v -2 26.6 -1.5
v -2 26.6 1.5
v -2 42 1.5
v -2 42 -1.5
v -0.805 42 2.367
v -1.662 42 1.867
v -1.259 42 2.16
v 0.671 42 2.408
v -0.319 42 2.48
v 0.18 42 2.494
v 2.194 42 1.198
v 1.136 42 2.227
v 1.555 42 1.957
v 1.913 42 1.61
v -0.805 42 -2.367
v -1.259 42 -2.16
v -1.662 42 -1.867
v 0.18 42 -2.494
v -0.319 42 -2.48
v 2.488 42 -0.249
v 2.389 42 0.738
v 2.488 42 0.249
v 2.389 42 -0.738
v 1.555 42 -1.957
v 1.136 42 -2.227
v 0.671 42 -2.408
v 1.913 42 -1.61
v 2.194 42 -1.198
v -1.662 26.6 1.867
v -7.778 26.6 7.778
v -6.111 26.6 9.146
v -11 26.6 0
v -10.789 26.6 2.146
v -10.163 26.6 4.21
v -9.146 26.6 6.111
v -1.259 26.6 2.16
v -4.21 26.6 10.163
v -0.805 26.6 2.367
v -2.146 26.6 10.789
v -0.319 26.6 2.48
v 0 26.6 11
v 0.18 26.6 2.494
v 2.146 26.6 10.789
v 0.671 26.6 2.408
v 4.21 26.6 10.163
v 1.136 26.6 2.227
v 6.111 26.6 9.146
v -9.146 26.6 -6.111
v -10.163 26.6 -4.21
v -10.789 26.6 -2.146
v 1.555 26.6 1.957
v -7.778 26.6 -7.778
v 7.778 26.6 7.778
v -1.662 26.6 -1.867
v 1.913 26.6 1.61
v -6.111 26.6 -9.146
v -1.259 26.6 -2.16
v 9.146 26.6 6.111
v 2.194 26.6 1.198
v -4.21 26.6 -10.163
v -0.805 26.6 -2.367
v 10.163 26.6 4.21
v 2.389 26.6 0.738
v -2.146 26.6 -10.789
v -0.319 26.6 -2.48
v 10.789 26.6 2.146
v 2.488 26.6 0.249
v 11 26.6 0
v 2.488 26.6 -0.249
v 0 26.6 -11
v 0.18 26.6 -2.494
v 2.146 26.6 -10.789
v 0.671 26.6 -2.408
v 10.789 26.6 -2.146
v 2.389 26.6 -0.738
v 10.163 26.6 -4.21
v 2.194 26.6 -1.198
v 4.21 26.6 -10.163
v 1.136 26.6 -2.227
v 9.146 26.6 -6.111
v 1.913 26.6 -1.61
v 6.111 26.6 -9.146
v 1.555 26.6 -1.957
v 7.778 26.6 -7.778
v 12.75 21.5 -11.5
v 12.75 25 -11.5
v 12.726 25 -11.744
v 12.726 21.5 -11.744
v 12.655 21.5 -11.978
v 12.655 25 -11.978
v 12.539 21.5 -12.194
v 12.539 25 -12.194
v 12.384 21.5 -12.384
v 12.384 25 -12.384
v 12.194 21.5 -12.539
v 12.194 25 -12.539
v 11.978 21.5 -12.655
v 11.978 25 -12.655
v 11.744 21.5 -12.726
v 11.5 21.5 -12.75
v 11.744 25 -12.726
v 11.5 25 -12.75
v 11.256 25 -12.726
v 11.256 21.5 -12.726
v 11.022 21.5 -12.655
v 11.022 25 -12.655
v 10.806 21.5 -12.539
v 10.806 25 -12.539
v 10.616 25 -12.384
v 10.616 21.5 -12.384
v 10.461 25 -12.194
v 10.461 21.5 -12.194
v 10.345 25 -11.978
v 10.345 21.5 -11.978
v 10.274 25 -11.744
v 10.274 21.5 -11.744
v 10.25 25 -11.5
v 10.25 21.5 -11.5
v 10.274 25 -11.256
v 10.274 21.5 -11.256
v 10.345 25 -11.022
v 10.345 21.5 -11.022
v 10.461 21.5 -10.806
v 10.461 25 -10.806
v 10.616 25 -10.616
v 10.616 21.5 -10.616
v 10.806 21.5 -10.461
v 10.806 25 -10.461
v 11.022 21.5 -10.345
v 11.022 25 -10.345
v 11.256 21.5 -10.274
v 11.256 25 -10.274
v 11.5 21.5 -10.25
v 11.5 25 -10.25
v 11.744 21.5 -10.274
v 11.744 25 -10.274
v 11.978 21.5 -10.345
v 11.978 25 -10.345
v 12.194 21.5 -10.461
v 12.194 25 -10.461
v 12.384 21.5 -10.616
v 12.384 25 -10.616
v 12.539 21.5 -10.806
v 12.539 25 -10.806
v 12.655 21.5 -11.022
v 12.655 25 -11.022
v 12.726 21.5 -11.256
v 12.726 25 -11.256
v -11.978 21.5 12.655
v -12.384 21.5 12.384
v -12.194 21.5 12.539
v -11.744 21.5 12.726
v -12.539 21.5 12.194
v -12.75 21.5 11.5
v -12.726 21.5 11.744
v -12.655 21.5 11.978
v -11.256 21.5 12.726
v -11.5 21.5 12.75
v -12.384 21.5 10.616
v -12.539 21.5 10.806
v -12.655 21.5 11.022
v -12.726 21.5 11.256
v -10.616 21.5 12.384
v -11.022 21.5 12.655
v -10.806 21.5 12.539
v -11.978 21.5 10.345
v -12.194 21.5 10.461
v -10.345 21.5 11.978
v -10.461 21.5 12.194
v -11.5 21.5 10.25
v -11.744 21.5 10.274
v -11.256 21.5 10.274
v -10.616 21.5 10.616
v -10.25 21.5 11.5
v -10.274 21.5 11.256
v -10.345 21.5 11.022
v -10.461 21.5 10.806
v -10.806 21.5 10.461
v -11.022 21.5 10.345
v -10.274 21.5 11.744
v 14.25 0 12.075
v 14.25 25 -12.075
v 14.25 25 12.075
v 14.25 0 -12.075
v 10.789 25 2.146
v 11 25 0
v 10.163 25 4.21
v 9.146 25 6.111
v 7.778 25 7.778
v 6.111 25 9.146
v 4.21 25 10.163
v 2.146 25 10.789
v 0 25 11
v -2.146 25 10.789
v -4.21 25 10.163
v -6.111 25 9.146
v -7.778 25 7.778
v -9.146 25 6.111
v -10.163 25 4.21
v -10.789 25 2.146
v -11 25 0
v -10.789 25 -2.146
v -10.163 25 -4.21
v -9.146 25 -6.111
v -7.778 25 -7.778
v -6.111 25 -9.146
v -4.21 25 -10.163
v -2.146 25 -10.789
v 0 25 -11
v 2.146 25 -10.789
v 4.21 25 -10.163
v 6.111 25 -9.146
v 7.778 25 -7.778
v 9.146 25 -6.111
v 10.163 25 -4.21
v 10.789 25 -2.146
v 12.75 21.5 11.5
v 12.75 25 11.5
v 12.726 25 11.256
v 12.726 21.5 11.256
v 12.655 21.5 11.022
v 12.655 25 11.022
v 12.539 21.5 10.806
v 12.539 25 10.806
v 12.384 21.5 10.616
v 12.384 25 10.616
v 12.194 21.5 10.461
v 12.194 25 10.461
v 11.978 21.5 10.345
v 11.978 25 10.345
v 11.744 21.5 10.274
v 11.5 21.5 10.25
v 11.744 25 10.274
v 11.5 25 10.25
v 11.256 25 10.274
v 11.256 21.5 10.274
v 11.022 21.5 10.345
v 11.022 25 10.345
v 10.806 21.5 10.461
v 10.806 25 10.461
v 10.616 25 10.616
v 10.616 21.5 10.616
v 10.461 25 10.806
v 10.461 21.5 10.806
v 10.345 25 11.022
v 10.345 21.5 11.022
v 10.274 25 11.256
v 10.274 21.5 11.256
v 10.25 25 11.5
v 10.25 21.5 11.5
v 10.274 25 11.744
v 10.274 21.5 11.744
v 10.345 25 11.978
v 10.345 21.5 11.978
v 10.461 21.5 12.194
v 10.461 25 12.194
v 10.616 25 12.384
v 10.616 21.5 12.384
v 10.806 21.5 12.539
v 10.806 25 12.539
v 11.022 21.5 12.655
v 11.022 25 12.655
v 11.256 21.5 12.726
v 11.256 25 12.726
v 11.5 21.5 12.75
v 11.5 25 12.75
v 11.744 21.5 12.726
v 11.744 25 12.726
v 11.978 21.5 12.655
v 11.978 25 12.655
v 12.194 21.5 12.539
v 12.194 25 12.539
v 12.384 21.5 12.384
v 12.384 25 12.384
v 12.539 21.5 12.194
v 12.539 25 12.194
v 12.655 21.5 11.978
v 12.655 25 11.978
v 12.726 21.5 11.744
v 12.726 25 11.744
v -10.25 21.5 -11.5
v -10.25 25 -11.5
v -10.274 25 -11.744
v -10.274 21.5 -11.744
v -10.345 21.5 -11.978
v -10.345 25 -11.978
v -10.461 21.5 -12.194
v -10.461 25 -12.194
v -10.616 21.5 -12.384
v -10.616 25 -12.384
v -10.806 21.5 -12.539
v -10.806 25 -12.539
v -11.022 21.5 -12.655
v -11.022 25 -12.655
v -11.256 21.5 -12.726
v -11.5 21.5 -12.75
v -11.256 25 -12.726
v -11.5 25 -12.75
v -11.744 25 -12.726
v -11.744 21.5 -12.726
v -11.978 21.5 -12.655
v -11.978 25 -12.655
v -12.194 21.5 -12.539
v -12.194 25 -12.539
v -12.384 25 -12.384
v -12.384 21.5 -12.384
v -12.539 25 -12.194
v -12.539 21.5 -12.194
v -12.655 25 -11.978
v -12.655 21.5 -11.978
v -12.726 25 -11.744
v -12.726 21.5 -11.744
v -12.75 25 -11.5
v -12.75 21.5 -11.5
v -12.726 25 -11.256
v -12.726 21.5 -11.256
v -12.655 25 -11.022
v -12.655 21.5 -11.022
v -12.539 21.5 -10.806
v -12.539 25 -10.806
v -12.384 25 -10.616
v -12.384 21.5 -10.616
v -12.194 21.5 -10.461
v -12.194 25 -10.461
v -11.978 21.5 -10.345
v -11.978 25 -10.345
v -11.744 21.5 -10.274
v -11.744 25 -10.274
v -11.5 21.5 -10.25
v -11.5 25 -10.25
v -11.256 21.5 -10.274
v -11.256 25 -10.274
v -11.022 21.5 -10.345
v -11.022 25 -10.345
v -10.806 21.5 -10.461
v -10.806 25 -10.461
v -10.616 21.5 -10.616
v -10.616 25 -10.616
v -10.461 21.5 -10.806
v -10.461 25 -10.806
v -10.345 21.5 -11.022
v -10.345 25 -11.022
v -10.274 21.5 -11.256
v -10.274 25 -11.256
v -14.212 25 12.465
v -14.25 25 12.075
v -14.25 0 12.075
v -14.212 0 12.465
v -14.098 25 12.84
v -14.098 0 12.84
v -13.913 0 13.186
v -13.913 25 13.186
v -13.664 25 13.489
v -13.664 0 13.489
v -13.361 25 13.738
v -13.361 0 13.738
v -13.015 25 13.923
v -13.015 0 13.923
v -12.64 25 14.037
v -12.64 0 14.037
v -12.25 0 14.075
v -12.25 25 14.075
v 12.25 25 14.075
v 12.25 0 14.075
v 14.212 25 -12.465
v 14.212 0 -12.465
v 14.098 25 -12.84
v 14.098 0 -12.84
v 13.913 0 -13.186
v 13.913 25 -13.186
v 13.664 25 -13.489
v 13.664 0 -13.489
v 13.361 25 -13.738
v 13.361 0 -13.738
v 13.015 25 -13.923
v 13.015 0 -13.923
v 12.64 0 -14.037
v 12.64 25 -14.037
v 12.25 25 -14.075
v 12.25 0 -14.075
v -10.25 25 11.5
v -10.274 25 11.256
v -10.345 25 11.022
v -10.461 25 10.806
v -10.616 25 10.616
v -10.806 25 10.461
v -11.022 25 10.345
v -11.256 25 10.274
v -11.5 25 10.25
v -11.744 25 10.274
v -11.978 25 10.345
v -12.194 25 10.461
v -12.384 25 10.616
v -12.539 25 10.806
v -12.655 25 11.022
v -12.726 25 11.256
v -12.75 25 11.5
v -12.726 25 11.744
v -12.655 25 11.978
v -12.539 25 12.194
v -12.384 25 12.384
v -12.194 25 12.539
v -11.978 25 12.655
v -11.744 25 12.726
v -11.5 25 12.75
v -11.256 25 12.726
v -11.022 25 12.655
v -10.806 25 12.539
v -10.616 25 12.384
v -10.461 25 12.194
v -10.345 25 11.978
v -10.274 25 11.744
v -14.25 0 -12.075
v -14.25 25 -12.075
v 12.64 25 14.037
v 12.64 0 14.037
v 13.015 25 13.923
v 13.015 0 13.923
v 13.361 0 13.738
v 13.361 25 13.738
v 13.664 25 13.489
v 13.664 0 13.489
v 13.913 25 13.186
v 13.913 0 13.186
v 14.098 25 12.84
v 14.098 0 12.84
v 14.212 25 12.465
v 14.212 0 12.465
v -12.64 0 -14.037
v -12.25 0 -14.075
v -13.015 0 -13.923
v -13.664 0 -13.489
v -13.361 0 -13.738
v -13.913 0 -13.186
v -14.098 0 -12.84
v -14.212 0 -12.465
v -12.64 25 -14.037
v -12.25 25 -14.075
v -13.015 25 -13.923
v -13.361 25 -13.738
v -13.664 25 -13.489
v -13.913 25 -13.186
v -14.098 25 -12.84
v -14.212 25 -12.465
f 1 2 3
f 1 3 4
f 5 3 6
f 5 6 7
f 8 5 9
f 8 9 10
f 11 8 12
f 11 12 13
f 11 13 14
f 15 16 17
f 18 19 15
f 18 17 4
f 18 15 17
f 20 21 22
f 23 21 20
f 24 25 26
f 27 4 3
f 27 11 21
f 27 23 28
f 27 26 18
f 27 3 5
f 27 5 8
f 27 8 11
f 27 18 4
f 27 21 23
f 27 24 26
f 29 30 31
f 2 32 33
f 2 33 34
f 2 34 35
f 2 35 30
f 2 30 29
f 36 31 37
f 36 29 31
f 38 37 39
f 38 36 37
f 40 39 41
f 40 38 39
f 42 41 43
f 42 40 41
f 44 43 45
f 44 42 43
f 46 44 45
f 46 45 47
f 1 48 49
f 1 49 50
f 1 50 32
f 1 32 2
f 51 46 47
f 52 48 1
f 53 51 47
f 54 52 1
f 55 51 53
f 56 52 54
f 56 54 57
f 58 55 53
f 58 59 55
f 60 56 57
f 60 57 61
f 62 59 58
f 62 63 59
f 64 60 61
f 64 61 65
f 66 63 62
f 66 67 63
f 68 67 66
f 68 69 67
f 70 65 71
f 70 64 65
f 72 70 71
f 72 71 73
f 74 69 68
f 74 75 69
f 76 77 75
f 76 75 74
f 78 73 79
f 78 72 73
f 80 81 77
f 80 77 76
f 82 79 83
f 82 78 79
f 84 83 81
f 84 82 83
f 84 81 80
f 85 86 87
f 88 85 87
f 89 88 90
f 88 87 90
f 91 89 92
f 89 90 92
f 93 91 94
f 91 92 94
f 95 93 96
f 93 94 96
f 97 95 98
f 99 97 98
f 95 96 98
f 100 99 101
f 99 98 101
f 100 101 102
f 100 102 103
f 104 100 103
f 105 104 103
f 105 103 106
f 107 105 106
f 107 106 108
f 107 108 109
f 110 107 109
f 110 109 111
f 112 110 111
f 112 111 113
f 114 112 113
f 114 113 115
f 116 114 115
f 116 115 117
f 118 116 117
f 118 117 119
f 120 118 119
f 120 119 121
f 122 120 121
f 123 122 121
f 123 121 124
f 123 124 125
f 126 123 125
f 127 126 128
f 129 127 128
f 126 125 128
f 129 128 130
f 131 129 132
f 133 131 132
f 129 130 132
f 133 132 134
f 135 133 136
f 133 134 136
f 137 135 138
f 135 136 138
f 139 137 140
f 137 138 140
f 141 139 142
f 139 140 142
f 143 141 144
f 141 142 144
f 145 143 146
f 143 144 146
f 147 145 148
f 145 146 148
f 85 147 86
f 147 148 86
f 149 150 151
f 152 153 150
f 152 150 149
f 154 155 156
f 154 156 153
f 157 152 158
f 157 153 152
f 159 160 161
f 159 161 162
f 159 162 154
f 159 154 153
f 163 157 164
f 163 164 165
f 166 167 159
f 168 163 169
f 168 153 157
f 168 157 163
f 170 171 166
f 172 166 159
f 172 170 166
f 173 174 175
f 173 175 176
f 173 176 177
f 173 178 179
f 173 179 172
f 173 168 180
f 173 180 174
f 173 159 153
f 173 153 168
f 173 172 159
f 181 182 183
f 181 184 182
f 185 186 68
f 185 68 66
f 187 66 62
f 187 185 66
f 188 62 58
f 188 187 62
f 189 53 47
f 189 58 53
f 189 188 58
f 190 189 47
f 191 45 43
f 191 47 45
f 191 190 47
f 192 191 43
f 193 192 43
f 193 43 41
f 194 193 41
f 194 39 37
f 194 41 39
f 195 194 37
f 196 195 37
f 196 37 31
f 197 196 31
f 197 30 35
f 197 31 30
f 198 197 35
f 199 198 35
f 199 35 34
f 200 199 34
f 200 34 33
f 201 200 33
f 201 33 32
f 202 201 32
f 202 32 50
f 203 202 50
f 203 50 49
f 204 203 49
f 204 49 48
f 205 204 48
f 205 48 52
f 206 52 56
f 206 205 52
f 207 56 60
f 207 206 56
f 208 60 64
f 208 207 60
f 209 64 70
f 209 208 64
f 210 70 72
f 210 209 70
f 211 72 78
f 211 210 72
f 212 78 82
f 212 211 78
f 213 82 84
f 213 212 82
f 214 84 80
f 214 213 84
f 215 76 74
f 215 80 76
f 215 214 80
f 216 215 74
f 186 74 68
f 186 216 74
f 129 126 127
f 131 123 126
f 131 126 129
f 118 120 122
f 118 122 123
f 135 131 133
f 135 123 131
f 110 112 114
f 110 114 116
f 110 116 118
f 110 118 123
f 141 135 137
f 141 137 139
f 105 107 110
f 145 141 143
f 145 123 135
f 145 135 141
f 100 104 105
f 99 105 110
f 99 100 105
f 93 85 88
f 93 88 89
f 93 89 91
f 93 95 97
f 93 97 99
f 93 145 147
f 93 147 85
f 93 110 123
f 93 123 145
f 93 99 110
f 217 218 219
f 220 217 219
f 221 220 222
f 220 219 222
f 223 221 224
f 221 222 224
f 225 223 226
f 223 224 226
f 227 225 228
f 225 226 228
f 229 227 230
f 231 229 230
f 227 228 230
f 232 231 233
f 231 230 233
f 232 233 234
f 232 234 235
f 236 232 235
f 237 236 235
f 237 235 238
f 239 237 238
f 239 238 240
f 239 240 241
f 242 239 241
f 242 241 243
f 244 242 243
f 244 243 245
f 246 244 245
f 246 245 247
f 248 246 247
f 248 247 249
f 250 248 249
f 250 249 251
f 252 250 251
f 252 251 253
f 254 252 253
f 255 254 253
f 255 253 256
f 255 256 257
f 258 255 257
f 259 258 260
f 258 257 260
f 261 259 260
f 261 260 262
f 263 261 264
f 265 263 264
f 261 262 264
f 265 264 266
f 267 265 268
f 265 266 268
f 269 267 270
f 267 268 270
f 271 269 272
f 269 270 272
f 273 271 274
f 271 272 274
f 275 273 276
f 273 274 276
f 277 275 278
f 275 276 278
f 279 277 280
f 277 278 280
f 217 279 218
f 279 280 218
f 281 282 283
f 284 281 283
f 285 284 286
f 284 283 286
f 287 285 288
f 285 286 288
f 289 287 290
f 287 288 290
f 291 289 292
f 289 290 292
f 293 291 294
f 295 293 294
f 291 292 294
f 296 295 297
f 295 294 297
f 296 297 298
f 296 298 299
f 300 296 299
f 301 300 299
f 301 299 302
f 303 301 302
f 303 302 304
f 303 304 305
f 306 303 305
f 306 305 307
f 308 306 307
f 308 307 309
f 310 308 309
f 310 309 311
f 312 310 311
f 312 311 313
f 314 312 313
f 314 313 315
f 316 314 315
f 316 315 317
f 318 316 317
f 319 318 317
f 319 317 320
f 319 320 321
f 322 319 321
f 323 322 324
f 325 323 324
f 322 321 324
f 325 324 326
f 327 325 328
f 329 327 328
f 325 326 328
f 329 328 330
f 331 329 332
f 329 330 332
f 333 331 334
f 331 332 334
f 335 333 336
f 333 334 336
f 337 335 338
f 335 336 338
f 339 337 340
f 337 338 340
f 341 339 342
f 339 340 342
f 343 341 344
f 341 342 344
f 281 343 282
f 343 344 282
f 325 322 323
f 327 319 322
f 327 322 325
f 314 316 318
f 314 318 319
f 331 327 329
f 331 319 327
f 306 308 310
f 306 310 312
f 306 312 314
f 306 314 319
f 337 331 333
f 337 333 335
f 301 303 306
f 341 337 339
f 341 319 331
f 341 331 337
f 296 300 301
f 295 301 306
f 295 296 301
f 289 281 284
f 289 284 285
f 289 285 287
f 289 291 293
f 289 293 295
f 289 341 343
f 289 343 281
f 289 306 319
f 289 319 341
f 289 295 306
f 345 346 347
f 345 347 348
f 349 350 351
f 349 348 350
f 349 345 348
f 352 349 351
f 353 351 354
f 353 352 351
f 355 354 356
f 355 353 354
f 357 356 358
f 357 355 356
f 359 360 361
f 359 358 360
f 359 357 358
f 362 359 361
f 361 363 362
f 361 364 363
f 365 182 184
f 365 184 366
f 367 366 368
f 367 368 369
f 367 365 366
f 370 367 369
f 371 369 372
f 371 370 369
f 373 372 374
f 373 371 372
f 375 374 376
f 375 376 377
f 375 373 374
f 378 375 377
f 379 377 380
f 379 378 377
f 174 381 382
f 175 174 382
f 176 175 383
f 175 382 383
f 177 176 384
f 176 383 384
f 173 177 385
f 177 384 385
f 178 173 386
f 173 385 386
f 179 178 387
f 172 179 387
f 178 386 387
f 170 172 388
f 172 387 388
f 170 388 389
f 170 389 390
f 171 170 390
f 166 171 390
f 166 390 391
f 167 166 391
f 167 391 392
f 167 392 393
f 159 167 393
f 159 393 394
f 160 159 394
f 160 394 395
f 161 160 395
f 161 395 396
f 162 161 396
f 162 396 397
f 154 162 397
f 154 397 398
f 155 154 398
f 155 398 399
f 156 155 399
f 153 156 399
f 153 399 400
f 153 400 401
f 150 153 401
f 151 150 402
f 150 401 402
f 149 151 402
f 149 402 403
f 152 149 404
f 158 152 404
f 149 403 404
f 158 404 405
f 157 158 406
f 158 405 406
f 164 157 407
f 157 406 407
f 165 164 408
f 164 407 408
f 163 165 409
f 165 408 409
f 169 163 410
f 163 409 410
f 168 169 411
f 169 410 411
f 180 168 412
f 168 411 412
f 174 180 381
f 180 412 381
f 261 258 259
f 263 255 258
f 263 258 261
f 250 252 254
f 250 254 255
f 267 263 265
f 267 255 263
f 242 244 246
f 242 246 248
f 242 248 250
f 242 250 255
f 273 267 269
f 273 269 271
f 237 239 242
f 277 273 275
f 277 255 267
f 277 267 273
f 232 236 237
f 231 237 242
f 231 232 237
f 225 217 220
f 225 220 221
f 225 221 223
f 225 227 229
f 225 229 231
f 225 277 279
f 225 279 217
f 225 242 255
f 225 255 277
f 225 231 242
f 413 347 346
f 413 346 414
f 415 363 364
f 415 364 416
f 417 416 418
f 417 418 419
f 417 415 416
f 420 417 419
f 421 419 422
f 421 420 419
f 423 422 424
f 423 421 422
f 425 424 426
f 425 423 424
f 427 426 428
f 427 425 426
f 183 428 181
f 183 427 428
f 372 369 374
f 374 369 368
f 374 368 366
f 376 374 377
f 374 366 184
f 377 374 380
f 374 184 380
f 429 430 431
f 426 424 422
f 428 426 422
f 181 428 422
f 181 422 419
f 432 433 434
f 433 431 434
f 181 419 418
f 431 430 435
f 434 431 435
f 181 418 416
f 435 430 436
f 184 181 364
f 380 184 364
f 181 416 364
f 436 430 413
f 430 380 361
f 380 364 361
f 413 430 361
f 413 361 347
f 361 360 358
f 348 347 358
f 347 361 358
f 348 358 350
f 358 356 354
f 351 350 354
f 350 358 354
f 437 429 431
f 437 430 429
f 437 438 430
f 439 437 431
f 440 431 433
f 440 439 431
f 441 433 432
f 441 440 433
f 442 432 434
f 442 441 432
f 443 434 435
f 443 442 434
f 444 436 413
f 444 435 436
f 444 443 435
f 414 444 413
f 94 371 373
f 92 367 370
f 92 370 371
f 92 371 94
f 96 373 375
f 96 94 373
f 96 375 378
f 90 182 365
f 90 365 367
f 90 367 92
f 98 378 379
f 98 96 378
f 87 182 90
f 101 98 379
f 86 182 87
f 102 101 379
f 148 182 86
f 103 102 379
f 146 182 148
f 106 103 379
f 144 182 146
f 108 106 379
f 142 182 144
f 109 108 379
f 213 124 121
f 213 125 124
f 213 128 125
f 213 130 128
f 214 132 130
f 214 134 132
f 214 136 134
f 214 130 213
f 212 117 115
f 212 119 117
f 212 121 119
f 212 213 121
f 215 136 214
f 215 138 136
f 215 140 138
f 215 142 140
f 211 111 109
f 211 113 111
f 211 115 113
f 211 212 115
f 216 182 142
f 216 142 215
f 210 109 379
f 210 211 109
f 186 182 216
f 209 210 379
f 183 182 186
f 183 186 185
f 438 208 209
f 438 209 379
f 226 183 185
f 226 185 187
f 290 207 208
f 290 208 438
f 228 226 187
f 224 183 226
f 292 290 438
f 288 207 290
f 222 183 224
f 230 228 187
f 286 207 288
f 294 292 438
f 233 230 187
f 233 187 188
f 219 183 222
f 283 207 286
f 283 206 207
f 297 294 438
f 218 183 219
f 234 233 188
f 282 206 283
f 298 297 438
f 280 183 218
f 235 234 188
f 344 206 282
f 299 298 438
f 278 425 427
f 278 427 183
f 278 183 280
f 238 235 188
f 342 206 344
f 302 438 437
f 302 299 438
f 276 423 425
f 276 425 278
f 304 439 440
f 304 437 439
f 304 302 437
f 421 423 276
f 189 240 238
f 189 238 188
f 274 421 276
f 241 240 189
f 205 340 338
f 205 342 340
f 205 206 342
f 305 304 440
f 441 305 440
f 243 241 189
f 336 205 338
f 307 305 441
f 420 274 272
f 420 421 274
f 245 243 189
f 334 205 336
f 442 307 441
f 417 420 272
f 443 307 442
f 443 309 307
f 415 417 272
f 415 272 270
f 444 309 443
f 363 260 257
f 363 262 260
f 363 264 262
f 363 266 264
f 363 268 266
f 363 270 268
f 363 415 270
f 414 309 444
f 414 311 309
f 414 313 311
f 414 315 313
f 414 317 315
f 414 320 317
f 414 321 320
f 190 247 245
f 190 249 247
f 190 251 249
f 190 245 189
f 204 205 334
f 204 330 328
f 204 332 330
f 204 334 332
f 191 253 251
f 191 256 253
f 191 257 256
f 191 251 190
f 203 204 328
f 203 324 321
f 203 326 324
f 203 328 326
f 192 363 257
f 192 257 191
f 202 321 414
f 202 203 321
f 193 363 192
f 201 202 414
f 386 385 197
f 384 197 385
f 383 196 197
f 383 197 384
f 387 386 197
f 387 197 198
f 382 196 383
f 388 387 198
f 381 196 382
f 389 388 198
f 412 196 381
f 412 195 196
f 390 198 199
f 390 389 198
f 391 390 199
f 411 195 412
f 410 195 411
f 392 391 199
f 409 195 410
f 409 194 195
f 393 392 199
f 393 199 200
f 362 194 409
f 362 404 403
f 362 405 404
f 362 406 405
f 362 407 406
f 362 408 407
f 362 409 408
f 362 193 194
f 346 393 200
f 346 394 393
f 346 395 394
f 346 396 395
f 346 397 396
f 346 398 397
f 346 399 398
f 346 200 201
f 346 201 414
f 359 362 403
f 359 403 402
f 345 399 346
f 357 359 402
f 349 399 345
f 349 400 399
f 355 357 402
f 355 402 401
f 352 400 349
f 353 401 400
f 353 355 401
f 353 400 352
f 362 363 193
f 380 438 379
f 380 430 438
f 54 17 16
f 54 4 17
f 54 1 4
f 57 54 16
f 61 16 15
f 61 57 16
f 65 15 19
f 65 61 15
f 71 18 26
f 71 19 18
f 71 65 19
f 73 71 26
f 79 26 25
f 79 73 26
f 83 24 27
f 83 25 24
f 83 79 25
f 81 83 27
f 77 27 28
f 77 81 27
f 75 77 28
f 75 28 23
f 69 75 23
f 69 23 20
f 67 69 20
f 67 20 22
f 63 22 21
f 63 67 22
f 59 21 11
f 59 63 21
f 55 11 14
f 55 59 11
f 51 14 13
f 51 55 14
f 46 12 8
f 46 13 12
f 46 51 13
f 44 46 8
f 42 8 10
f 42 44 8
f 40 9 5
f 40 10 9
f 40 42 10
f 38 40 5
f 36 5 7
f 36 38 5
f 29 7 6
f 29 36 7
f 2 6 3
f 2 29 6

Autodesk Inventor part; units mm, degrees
ref_plane "YZ Plane" through (0, 0, 0) normal (1, 0, 0) x (0, 1, 0)
ref_plane "XZ Plane" through (0, 0, 0) normal (0, 1, 0) x (-1, 0, 0)
ref_plane "XY Plane" through (0, 0, 0) normal (0, 0, 1) x (1, 0, 0)
sketch "草圖1" plane through (0, 0, 0) normal (0, 1, 0) x (-1, 0, 0)
  line L0 (-14.25, 14.075) -> (14.25, 14.075)
  line L1 (14.25, 14.075) -> (14.25, -14.075)
  line L2 (14.25, -14.075) -> (-14.25, -14.075)
  line L3 (-14.25, -14.075) -> (-14.25, 14.075)
  line L4 (-14.25, 14.075) -> (14.25, -14.075) construction
  line L5 (14.25, 14.075) -> (-14.25, -14.075) construction
  point P0 (0, 0)
  dimension "d0" = 28.5
  dimension "d1" = 28.15
extrude "擠出1" add sketch "草圖1" along normal blind 25
sketch "草圖2" plane through (0, 25, 0) normal (0, 1, 0) x (1, 0, 0)
  circle A0 centre (0, 0) radius 11
  dimension "d4" = 22
extrude "擠出2" add sketch "草圖2" along normal blind 1.6
sketch "草圖3" plane through (0, 26.6, 0) normal (0, 1, 0) x (1, 0, 0)
  arc A0 (-2, -1.5) -> (-2, 1.5) centre (0, 0) ccw
  line L0 (-2, -1.5) -> (-2, 1.5)
  dimension "d7" = 5
  dimension "d8" = 2
extrude "擠出3" add sketch "草圖3" along normal blind 15.4
sketch "草圖4" plane through (0, 25, 0) normal (0, 1, 0) x (1, 0, 0)
  line L0 (11.5, -11.5) -> (-11.5, -11.5) construction
  line L1 (-11.5, -11.5) -> (-11.5, 11.5) construction
  line L2 (-11.5, 11.5) -> (11.5, 11.5) construction
  line L3 (11.5, 11.5) -> (11.5, -11.5) construction
  arc A0 (-2, -1.5) -> (-2, 1.5) centre (0, 0) ccw construction
  line L4 (11.5, -11.5) -> (-11.5, 11.5) construction
  line L5 (-11.5, -11.5) -> (11.5, 11.5) construction
  circle A1 centre (-11.5, 11.5) radius 1.25
  circle A2 centre (-11.5, -11.5) radius 1.25
  circle A3 centre (11.5, -11.5) radius 1.25
  circle A4 centre (11.5, 11.5) radius 1.25
  dimension "d11" = 23
  dimension "d12" = 23
  dimension "d13" = 2.5
  dimension "d16" = 360
extrude "擠出4" cut sketch "草圖4" against normal blind 3.5
fillet "圓角1" radius 2 4 edges at (14.25, 12.5, 14.075) (14.25, 12.5, -14.075) (-14.25, 12.5, 14.075) (-14.25, 12.5, -14.075)
sketch "草圖5" plane through (0, 42, 0) normal (0, 1, 0) x (1, 0, 0)
  point P0 (0, 0)
  point P1 (0, 0)
properties part number "nema 11x25"
